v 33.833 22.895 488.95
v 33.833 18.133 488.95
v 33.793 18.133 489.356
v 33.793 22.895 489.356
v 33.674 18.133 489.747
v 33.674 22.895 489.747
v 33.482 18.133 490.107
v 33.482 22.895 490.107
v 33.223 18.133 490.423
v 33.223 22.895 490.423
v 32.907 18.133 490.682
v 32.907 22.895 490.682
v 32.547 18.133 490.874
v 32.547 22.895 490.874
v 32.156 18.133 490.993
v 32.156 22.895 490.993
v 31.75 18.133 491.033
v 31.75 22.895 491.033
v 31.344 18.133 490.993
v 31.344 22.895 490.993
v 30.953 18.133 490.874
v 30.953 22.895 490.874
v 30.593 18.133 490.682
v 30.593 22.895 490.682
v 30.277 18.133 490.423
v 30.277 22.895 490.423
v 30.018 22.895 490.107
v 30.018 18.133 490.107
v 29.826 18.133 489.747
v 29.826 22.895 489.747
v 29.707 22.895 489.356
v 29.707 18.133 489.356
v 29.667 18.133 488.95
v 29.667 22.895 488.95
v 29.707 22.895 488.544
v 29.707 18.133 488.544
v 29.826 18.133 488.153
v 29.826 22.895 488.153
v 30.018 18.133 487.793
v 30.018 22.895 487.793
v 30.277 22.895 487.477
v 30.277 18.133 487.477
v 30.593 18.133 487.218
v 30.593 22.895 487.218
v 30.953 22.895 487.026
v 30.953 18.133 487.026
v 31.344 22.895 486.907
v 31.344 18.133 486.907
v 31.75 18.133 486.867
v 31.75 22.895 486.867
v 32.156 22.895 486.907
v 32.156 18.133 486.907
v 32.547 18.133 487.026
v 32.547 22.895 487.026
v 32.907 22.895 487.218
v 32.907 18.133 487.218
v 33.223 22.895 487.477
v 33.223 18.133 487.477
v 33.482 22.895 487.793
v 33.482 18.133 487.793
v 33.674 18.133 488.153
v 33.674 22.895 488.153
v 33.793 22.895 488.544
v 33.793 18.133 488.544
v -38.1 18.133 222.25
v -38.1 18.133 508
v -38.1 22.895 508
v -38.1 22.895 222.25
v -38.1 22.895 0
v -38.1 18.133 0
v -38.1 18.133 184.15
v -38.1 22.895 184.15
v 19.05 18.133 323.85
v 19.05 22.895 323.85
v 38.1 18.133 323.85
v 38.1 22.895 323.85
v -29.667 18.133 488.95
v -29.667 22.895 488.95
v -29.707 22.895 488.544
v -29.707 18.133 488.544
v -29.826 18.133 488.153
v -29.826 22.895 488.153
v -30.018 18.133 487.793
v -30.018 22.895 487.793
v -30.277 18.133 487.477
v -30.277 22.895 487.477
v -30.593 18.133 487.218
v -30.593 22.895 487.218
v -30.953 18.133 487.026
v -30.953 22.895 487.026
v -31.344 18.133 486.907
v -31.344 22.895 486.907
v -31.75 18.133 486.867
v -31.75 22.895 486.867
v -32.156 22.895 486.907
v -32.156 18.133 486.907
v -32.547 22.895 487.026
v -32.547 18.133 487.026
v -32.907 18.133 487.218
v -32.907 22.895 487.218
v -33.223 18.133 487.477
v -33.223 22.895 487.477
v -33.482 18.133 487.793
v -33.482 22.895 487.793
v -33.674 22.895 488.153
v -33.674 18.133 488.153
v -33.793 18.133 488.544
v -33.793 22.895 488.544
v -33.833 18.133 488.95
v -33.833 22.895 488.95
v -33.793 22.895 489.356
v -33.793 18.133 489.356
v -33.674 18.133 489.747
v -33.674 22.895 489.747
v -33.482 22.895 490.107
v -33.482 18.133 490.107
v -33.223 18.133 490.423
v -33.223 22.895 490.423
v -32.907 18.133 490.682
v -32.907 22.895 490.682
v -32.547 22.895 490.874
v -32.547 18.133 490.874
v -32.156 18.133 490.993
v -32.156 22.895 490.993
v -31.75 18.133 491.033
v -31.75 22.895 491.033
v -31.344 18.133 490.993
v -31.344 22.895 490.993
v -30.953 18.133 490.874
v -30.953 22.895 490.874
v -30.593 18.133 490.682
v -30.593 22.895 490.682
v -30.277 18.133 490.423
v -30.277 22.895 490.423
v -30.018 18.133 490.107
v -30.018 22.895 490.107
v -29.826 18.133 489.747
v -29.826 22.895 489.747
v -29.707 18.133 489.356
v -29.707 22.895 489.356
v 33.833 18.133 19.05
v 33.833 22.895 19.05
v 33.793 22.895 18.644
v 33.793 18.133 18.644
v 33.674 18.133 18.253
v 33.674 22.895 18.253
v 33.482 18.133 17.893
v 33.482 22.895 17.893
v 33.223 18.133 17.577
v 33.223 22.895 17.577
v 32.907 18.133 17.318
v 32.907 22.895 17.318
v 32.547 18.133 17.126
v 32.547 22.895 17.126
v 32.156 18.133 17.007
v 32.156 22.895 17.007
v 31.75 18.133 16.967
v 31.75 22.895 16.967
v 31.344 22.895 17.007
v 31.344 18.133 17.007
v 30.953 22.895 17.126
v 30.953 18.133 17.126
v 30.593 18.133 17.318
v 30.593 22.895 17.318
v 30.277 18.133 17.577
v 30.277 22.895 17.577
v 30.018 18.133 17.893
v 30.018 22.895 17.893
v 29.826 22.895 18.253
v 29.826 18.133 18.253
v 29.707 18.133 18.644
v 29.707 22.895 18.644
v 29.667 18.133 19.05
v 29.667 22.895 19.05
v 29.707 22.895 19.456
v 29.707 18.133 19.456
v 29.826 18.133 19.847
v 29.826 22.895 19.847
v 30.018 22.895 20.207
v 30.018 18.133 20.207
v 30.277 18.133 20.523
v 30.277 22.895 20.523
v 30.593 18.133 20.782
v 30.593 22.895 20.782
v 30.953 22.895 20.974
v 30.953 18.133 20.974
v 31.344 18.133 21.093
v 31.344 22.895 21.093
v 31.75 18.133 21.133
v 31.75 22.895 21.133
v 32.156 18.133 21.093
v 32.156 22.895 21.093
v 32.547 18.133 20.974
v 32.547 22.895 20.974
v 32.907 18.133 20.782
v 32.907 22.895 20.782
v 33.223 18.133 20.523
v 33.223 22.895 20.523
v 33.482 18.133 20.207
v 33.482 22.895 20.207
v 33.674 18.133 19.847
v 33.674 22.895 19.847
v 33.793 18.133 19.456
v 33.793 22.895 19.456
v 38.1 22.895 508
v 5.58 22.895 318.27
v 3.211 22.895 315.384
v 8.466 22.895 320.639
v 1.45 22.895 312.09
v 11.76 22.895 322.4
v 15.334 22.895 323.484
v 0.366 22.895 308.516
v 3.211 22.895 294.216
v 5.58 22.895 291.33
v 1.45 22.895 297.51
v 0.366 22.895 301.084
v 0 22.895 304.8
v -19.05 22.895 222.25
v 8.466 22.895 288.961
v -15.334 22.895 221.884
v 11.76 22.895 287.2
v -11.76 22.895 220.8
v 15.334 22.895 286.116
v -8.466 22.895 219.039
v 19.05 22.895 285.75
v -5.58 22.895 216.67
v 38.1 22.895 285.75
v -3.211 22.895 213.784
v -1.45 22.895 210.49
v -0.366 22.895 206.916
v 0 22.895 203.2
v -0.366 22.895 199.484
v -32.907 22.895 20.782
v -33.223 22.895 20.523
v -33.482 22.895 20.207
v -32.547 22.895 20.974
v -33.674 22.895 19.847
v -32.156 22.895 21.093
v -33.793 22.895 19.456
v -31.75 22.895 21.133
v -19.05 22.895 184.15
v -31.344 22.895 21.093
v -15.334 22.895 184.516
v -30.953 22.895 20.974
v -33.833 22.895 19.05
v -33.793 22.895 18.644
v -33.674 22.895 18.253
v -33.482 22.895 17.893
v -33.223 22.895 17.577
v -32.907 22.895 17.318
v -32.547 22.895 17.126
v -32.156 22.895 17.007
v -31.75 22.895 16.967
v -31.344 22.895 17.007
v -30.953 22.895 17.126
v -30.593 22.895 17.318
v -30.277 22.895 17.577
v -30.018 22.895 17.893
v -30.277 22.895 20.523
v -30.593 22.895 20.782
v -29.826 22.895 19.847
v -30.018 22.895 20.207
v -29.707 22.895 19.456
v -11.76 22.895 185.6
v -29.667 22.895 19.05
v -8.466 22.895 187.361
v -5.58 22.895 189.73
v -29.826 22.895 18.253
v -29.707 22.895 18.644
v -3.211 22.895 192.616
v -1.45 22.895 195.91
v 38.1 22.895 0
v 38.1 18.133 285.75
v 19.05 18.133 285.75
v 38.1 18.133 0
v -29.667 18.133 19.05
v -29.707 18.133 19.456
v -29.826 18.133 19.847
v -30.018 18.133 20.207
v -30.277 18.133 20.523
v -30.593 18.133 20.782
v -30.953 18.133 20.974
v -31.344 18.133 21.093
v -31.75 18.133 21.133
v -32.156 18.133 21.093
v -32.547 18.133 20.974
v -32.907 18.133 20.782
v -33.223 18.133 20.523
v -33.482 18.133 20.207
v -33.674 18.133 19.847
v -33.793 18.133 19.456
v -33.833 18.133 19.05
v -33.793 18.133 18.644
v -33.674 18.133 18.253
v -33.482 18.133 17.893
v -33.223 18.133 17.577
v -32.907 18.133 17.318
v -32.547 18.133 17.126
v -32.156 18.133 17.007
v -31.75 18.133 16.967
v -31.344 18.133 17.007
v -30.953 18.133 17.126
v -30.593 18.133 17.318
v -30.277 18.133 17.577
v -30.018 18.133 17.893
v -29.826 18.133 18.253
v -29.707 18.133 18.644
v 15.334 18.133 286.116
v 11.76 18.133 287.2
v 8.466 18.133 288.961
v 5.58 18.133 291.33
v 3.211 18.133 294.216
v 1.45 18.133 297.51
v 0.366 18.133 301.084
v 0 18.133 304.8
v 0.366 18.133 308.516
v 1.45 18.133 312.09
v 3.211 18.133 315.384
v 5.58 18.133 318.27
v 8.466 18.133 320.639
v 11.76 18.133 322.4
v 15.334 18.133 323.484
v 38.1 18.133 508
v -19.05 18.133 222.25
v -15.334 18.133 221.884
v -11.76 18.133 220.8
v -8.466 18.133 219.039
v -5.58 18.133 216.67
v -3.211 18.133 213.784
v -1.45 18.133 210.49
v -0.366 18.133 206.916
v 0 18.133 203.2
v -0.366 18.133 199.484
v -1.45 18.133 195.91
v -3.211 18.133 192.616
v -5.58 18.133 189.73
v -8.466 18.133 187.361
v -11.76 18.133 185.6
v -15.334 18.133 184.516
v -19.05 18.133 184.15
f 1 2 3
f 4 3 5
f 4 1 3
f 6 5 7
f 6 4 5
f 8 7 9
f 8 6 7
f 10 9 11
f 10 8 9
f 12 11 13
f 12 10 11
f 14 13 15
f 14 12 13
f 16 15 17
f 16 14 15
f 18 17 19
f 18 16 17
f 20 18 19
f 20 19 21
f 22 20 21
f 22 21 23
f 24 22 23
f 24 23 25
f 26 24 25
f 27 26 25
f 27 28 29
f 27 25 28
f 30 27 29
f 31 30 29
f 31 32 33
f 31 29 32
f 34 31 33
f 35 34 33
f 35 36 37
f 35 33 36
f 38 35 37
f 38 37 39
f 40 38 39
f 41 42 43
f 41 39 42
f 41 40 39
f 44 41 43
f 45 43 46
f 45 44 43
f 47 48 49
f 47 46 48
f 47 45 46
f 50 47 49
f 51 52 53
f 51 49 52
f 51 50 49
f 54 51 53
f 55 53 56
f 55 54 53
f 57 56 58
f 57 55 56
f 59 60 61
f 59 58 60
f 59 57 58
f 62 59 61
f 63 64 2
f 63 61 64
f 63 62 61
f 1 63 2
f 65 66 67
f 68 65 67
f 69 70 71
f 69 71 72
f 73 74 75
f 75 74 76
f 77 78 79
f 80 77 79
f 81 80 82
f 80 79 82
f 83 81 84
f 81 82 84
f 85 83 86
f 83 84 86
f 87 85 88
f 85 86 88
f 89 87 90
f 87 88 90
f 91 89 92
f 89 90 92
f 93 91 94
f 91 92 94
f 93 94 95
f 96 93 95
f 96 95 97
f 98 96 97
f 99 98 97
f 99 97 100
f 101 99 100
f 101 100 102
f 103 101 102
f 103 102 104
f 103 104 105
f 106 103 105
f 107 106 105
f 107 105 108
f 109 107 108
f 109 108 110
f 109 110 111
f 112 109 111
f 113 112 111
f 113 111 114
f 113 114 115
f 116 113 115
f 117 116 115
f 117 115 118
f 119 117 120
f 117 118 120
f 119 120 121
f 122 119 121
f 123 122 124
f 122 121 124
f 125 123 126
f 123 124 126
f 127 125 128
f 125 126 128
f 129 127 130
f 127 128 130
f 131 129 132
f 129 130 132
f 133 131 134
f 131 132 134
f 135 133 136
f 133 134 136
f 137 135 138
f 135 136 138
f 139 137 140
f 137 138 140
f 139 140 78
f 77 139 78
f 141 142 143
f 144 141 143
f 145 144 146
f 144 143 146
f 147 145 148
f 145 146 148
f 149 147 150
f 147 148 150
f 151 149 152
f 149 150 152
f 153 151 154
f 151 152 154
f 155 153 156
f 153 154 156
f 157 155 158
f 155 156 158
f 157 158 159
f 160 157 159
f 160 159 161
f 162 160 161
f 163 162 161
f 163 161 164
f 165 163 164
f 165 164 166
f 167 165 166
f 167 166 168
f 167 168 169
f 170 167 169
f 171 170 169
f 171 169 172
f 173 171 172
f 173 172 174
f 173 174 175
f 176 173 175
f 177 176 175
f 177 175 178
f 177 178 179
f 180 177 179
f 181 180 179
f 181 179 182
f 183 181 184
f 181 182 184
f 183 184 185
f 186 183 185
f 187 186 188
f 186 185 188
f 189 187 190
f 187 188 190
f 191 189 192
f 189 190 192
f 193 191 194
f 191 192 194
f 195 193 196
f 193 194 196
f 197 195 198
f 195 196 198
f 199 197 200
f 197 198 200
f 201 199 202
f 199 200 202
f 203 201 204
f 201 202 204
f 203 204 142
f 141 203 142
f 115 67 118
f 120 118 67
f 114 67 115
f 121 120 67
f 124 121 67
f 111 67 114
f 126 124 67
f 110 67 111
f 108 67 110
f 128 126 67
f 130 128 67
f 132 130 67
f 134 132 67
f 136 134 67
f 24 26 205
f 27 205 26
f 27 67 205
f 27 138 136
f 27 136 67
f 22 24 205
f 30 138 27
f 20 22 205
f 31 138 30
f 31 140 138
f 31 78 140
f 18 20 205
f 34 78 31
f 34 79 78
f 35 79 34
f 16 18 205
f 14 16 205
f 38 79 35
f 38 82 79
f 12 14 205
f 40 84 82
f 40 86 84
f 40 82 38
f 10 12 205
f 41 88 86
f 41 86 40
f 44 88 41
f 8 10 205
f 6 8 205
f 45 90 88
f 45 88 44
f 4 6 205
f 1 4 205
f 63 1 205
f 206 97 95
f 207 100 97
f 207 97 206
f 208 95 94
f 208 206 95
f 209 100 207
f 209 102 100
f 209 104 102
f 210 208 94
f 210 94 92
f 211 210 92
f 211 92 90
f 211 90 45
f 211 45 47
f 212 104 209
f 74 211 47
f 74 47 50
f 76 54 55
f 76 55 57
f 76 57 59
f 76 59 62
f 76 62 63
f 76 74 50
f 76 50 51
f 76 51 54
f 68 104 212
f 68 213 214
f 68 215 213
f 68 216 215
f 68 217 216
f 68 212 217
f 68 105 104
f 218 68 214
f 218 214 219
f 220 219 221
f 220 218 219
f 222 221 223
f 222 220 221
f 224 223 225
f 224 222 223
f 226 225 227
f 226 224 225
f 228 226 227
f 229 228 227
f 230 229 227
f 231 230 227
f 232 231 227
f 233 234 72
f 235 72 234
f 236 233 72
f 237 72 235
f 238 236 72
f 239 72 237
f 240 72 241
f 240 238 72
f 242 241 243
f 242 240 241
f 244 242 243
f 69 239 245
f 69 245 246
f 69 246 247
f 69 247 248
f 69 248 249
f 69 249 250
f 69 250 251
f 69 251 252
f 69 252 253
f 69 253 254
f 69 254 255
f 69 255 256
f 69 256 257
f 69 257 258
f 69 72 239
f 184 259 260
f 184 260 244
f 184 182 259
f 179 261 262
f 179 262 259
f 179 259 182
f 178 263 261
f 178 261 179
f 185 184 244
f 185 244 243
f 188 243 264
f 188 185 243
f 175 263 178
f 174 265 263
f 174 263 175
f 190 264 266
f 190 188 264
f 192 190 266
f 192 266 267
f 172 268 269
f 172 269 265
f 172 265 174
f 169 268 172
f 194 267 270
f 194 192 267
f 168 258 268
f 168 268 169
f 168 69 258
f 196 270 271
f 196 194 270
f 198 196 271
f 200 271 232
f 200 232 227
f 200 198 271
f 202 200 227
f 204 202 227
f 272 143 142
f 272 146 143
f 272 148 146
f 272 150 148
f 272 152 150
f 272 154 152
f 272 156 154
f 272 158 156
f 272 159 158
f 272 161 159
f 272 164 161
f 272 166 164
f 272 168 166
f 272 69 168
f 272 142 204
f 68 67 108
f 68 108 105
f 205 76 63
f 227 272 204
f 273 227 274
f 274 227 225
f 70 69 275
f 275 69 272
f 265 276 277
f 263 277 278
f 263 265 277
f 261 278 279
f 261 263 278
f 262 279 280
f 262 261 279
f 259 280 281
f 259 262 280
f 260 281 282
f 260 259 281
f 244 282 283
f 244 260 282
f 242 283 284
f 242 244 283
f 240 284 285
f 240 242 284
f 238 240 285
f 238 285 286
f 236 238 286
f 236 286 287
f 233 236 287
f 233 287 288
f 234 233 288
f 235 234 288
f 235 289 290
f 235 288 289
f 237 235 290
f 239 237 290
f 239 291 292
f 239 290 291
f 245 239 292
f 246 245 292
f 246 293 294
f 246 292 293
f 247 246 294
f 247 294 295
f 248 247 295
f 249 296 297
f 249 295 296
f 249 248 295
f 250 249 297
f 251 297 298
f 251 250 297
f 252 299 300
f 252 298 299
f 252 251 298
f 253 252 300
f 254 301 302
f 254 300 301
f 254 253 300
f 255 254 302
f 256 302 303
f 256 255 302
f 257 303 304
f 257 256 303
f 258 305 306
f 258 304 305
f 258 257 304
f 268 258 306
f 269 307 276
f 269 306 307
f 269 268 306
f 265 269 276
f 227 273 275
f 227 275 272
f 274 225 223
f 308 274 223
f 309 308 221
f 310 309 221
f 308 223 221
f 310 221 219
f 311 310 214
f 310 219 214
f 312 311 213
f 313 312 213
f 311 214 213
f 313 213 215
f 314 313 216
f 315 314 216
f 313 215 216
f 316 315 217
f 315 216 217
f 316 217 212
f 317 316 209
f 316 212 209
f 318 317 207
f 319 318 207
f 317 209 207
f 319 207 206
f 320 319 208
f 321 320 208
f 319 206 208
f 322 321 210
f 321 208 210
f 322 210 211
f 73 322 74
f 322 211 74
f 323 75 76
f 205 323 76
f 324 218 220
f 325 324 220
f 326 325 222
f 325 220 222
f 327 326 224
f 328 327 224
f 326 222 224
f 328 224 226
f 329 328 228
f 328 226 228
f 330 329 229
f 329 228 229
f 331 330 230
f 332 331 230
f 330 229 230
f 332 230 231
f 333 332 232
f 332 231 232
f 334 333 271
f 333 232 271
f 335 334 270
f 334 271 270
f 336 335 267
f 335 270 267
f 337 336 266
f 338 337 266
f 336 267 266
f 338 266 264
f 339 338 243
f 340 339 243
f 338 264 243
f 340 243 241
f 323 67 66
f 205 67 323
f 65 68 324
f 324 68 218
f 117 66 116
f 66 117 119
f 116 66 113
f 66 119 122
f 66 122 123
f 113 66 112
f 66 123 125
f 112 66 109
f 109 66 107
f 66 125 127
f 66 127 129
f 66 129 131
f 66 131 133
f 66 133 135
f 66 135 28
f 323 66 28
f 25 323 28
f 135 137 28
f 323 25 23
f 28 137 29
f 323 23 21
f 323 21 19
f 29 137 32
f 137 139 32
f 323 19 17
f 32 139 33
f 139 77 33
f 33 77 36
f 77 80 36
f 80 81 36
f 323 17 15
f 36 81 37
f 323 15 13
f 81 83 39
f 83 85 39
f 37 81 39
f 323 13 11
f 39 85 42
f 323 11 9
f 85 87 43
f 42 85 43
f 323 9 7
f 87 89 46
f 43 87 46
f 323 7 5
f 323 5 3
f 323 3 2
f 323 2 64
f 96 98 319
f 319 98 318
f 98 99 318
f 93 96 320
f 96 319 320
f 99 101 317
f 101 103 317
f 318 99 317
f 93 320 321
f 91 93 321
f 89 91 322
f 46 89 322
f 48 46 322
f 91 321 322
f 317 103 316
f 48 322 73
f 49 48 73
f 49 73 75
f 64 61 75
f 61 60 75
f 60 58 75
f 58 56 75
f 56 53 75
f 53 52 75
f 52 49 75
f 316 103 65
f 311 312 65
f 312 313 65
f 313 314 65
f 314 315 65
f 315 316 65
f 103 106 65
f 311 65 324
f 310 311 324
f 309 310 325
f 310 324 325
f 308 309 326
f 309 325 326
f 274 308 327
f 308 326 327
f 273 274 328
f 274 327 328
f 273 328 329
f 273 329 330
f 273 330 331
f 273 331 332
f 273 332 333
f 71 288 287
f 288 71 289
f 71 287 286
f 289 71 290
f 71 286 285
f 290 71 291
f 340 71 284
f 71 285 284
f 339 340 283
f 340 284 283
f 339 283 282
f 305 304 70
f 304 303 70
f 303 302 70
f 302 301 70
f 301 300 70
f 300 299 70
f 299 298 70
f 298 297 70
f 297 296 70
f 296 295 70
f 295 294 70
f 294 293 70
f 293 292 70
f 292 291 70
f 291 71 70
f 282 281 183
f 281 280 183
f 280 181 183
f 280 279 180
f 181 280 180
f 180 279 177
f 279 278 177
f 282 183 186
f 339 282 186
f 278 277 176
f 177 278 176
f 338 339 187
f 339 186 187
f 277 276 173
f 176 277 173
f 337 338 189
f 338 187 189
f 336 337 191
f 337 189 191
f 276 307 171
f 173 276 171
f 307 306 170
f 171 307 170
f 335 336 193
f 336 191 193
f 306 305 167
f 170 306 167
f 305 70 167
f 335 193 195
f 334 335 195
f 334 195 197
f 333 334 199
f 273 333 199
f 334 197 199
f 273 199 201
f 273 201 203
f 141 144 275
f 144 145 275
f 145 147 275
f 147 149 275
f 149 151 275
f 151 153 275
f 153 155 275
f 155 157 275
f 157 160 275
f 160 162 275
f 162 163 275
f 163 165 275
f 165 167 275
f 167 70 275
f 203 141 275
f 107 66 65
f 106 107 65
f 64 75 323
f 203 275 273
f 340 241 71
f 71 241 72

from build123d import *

# Parameters (mm, degrees)
SKETCH1_W           = 76.2
SKETCH1_H           = 4.7625
BOSS_EXTRUDE1_DEPTH = 508
CUT_EXTRUDE1_DEPTH  = 5.7625
SKETCH3_R           = 2.0828
CUT_EXTRUDE2_DEPTH  = 5.7625


with BuildPart() as part:
    # Sketch1 → Boss-Extrude1 (new body)
    with BuildSketch(Plane.XY):
        with Locations((0, 20.514000599)):
            Rectangle(SKETCH1_W, SKETCH1_H)
    extrude(amount=BOSS_EXTRUDE1_DEPTH)

    # Sketch2 → Cut-Extrude1 (cut, through all)
    with BuildSketch(Plane(origin=(0, 22.895250599, 0), x_dir=(1, 0, 0), z_dir=(0, 1, 0))):
        with BuildLine():
            Line((-19.05, -184.15), (-38.1, -184.15))
            Line((-38.1, -184.15), (-38.1, -222.25))
            Line((-38.1, -222.25), (-19.05, -222.25))
            ThreePointArc((-19.05, -222.25), (0, -203.2), (-19.05, -184.15))
        make_face()
        with BuildLine():
            Line((19.05, -323.85), (38.1, -323.85))
            Line((38.1, -323.85), (38.1, -285.75))
            Line((38.1, -285.75), (19.05, -285.75))
            ThreePointArc((19.05, -285.75), (0, -304.8), (19.05, -323.85))
        make_face()
    extrude(amount=-CUT_EXTRUDE1_DEPTH, mode=Mode.SUBTRACT)

    # Sketch3 → Cut-Extrude2 (cut, through all)
    with BuildSketch(Plane(origin=(0, 22.895250599, 0), x_dir=(1, 0, 0), z_dir=(0, 1, 0))):
        with Locations((-31.75, -488.95)):
            Circle(SKETCH3_R)
        with Locations((31.75, -19.05)):
            Circle(SKETCH3_R)
    cut_extrude2 = extrude(amount=-CUT_EXTRUDE2_DEPTH, mode=Mode.SUBTRACT)

    # Mirror1: Cut-Extrude2 across plane
    add(cut_extrude2.mirror(Plane.XY.offset(254)), mode=Mode.SUBTRACT)


solid = part.part
